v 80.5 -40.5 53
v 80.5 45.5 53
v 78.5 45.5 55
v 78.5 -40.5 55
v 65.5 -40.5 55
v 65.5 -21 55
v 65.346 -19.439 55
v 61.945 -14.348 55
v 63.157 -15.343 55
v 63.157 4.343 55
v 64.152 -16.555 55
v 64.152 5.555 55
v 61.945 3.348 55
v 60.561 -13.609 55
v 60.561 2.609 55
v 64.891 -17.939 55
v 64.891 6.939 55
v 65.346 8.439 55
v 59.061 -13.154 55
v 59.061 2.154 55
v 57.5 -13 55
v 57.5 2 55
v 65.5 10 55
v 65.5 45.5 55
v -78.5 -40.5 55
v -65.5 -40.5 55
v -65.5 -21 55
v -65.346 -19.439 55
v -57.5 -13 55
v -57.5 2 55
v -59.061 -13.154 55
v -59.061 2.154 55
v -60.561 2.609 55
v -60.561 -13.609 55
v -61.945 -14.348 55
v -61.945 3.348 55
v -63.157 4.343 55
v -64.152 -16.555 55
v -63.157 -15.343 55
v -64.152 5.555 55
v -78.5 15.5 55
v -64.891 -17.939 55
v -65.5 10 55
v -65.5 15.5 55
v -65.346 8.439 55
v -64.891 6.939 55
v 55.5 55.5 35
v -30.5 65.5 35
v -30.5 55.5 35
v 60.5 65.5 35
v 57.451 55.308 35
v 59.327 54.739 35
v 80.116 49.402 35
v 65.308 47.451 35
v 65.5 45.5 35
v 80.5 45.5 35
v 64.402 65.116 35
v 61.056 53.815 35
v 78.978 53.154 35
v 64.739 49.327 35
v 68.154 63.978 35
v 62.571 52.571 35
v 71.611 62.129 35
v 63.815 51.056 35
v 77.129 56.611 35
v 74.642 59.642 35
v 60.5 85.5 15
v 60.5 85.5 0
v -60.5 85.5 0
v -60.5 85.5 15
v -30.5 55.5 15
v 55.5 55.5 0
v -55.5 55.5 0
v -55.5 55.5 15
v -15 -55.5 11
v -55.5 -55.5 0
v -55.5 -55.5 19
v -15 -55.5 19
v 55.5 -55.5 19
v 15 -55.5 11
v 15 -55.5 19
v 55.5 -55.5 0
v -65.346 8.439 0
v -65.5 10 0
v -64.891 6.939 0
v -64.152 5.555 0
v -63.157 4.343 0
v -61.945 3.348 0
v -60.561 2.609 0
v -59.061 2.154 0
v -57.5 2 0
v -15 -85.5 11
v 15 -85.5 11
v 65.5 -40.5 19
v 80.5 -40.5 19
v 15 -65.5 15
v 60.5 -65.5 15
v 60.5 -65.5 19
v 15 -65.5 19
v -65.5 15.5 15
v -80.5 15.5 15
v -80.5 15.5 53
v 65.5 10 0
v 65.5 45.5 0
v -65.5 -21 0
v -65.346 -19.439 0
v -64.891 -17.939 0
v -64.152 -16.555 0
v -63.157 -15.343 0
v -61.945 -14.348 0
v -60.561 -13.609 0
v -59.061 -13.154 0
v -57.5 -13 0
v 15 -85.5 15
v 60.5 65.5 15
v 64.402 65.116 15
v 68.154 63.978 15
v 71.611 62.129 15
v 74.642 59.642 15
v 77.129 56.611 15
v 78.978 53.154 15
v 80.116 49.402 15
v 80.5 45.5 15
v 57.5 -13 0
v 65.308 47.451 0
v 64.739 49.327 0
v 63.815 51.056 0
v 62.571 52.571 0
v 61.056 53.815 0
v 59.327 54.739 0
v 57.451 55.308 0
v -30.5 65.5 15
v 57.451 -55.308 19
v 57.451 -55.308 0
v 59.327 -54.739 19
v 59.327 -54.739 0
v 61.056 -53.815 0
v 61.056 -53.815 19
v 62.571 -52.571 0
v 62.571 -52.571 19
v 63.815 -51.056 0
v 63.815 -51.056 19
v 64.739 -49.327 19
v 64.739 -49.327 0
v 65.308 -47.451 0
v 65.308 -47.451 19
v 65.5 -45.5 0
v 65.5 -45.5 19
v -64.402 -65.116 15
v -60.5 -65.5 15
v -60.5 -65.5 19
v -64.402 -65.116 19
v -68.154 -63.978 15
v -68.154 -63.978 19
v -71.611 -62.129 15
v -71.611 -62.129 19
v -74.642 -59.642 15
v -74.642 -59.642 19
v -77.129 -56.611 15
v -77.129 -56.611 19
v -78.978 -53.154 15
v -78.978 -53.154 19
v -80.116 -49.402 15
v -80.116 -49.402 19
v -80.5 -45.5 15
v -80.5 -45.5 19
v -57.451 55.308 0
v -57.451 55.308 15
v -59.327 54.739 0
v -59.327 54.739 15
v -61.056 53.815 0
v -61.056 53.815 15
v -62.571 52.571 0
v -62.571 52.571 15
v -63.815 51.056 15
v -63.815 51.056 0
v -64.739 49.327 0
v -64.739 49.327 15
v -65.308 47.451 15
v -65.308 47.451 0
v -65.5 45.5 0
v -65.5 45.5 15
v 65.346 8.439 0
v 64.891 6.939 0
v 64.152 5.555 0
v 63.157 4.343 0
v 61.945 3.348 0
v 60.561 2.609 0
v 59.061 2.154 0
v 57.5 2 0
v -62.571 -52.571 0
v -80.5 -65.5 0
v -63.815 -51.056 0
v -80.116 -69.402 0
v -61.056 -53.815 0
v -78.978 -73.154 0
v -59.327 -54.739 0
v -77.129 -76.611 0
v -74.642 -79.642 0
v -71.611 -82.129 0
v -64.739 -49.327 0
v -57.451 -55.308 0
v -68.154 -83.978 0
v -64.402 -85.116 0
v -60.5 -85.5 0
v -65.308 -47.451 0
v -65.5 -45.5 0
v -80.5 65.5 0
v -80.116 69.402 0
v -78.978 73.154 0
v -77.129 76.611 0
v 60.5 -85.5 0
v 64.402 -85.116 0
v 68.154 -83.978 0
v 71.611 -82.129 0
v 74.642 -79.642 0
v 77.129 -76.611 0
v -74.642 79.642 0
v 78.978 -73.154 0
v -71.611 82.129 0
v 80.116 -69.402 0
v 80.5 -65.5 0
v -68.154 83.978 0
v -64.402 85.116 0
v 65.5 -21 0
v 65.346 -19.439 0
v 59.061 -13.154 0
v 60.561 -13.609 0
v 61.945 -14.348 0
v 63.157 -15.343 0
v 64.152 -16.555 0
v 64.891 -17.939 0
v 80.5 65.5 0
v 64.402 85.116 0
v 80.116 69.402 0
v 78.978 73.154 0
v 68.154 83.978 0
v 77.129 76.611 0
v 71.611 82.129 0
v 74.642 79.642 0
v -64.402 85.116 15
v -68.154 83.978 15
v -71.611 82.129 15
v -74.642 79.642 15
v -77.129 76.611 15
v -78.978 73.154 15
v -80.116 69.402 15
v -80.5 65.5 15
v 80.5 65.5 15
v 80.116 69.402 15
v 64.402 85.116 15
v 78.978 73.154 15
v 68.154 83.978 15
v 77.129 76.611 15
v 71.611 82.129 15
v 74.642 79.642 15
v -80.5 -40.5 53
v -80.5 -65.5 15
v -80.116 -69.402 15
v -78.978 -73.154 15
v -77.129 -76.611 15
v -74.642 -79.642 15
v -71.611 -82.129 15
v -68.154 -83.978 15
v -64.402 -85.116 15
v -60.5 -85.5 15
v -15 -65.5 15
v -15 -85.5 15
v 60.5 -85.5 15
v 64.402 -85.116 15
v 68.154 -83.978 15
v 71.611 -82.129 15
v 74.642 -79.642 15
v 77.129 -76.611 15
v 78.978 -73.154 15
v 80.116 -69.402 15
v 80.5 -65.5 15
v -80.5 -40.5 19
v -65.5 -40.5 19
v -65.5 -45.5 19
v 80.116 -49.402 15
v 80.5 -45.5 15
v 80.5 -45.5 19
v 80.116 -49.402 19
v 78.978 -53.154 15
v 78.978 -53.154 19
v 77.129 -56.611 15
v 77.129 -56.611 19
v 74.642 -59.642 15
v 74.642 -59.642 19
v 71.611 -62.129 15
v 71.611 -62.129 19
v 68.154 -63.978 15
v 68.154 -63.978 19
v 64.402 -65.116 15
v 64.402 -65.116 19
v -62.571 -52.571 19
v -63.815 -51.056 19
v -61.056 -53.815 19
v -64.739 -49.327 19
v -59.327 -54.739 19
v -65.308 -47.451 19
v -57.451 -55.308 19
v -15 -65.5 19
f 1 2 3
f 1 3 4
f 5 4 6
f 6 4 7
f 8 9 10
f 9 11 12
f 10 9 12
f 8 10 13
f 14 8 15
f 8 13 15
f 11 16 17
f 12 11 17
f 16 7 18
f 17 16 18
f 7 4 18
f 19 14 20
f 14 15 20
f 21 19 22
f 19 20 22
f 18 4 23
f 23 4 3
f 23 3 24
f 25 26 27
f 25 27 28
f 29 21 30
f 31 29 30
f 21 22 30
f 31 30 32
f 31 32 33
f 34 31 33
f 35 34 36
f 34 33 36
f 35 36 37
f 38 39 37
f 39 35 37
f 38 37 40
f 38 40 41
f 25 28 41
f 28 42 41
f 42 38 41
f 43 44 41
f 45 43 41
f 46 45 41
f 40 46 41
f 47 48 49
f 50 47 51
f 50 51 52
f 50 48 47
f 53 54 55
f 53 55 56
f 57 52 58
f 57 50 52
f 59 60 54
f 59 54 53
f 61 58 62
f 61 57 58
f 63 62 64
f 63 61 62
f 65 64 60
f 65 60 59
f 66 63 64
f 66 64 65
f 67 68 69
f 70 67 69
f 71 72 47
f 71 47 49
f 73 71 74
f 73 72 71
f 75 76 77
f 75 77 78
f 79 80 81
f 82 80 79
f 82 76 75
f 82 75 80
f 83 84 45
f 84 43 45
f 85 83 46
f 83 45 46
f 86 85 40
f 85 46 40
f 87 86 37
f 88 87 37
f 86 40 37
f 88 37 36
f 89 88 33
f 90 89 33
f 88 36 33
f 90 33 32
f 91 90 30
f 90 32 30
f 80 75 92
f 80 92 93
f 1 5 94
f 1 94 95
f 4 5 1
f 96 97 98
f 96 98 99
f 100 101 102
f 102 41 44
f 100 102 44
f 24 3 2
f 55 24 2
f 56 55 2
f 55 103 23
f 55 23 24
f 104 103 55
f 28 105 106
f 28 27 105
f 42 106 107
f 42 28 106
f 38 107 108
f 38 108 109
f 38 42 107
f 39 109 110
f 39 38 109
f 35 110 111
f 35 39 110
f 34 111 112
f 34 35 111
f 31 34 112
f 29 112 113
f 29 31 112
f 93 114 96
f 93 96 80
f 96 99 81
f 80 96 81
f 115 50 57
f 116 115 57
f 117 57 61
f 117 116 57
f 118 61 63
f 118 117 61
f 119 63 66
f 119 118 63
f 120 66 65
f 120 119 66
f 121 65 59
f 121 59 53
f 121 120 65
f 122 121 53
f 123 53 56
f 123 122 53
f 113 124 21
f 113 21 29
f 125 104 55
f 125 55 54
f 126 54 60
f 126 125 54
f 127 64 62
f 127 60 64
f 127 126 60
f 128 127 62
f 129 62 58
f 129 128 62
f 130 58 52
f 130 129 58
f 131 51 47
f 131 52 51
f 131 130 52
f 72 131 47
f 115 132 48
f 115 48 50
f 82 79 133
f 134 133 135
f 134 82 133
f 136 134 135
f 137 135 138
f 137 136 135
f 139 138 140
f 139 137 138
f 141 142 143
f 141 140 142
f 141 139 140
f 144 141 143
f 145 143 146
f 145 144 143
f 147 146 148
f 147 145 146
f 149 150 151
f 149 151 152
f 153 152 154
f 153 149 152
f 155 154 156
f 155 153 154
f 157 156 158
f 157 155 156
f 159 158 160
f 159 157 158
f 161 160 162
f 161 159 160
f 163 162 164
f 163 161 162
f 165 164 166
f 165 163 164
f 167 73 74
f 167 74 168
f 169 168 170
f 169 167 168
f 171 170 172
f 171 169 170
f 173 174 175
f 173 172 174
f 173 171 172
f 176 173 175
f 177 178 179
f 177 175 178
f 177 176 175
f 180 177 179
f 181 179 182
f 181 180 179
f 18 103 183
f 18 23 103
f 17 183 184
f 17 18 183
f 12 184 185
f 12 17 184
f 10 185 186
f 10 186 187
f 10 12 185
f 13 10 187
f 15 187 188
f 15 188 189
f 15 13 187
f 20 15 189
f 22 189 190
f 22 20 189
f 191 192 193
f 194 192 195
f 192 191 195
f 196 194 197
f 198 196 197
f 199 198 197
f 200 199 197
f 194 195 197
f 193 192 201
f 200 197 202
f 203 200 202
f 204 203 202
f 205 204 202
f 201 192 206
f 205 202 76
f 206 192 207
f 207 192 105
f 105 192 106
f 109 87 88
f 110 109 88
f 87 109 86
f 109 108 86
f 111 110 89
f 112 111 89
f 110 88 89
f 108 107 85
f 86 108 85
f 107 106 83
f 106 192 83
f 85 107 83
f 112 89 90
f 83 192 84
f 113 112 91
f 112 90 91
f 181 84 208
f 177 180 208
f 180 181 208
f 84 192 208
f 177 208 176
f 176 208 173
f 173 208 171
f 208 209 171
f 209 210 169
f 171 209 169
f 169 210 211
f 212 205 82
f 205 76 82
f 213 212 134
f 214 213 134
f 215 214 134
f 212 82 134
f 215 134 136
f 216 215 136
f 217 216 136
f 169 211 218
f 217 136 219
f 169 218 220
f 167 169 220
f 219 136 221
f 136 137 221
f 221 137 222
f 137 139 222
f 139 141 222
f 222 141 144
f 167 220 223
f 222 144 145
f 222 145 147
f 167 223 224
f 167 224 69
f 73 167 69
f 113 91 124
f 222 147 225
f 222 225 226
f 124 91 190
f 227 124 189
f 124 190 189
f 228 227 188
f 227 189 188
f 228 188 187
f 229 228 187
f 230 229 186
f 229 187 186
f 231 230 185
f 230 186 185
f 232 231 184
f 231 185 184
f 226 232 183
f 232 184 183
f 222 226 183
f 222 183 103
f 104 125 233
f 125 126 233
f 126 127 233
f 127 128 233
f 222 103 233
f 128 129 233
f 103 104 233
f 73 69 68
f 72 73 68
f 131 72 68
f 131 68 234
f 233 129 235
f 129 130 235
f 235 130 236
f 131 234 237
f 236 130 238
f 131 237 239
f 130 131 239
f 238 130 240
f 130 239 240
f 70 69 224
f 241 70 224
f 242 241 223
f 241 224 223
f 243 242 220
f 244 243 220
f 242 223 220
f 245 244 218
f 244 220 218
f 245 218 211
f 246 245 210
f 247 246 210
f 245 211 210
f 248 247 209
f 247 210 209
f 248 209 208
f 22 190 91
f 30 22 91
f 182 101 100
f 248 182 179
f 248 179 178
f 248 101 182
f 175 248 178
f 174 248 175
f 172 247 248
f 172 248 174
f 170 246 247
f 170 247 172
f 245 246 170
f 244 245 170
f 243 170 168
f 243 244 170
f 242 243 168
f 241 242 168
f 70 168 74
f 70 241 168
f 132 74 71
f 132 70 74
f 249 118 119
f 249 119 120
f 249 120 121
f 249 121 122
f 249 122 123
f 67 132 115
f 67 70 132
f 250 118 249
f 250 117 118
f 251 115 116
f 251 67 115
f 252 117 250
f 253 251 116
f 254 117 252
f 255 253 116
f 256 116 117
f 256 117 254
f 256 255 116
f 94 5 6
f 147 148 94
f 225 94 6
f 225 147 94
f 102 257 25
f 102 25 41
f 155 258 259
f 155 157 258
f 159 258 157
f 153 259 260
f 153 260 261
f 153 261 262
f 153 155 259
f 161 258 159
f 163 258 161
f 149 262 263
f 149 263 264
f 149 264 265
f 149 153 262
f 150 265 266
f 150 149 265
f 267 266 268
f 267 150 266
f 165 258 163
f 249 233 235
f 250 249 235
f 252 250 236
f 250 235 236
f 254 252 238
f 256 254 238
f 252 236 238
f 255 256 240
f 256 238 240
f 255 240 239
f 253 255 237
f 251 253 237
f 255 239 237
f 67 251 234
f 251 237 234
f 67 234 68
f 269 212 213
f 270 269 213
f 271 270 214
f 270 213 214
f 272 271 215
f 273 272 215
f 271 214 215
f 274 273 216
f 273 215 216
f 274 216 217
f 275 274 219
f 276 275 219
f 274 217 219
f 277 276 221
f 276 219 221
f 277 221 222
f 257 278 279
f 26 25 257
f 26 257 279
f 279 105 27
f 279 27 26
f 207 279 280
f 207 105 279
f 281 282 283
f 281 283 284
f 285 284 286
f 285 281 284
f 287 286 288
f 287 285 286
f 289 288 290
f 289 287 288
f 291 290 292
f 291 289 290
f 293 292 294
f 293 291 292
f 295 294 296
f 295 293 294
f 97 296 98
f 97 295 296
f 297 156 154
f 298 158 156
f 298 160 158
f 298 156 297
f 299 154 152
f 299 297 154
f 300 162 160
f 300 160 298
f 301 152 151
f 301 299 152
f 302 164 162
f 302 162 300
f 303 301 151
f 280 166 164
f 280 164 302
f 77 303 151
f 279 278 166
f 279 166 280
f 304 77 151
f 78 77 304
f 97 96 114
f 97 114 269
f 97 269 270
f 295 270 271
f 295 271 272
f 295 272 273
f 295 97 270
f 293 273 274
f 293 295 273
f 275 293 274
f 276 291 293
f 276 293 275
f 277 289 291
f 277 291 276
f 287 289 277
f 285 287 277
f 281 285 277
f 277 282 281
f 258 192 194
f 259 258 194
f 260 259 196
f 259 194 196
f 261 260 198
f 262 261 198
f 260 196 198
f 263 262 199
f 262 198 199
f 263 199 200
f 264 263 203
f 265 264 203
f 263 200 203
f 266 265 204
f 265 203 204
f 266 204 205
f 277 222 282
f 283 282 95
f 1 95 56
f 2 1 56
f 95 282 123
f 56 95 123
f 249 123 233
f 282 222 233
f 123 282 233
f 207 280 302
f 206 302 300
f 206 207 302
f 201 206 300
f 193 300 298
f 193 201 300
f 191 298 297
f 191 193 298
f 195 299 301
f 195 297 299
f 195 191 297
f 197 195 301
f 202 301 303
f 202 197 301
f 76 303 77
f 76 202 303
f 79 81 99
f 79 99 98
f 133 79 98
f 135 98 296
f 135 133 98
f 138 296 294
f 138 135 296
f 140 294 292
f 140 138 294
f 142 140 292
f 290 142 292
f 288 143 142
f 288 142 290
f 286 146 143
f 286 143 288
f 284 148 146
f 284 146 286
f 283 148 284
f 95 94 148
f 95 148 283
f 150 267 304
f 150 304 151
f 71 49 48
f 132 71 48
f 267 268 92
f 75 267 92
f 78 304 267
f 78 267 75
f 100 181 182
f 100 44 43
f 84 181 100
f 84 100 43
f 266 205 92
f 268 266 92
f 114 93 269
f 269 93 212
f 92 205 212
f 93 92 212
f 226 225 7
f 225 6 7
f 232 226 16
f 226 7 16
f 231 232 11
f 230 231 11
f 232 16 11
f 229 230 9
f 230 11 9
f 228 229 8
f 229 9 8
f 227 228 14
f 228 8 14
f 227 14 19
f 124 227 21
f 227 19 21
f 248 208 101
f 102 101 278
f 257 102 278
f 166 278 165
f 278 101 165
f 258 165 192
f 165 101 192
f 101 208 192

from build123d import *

# Parameters (mm, degrees)
BOSS_EXTRUDE1_DEPTH = 55
BOSS_EXTRUDE3_DEPTH = 15
SKETCH4_W           = 190.013565595
SKETCH4_H           = 25
CUT_EXTRUDE1_DEPTH  = 36
SKETCH5_W           = 30
SKETCH5_H           = 30
CUT_EXTRUDE2_DEPTH  = 8
SKETCH6_W           = 72.414600628
SKETCH6_H           = 59.825353167
CUT_EXTRUDE3_DEPTH  = 40
SKETCH7_W           = 143.244471566
SKETCH7_H           = 49.658158813
CUT_EXTRUDE4_DEPTH  = 20
SKETCH8_W           = 131
SKETCH8_H           = 15
BOSS_EXTRUDE4_DEPTH = 55
FILLET1_R           = 8
CHAMFER1_SIZE       = 2


with BuildPart() as part:
    # Sketch1 → Boss-Extrude1 (new body)
    with BuildSketch(Plane.XY):
        with BuildLine():
            Line((-60.5, 65.5), (60.5, 65.5))
            ThreePointArc((60.5, 65.5), (74.642135624, 59.642135624), (80.5, 45.5))
            Line((80.5, 45.5), (80.5, -45.5))
            ThreePointArc((80.5, -45.5), (74.642135624, -59.642135624), (60.5, -65.5))
            Line((60.5, -65.5), (-60.5, -65.5))
            ThreePointArc((-60.5, -65.5), (-74.642135624, -59.642135624), (-80.5, -45.5))
            Line((-80.5, -45.5), (-80.5, 45.5))
            ThreePointArc((-80.5, 45.5), (-74.642135624, 59.642135624), (-60.5, 65.5))
        make_face()
        with BuildLine():
            Line((-65.5, 45.5), (-65.5, -45.5))
            ThreePointArc((-65.5, -45.5), (-62.571067812, -52.571067812), (-55.5, -55.5))
            Line((-55.5, -55.5), (55.5, -55.5))
            ThreePointArc((55.5, -55.5), (62.571067812, -52.571067812), (65.5, -45.5))
            Line((65.5, -45.5), (65.5, 45.5))
            ThreePointArc((65.5, 45.5), (62.571067812, 52.571067812), (55.5, 55.5))
            Line((55.5, 55.5), (-55.5, 55.5))
            ThreePointArc((-55.5, 55.5), (-62.571067812, 52.571067812), (-65.5, 45.5))
        make_face(mode=Mode.SUBTRACT)
    extrude(amount=BOSS_EXTRUDE1_DEPTH)

    # Sketch3 → Boss-Extrude3 (add)
    with BuildSketch(Plane(origin=(0, 0, 0), x_dir=(-1, 0, 0), z_dir=(0, 0, -1))):
        with BuildLine():
            Line((-80.5, 45.5), (-80.5, 65.5))
            ThreePointArc((-80.5, 65.5), (-74.642135624, 79.642135624), (-60.5, 85.5))
            Line((-60.5, 85.5), (60.5, 85.5))
            ThreePointArc((60.5, 85.5), (74.642135624, 79.642135624), (80.5, 65.5))
            Line((80.5, 65.5), (80.5, 45.5))
            ThreePointArc((80.5, 45.5), (74.642135624, 59.642135624), (60.5, 65.5))
            Line((60.5, 65.5), (-60.5, 65.5))
            ThreePointArc((-60.5, 65.5), (-74.642135624, 59.642135624), (-80.5, 45.5))
        make_face()
        with BuildLine():
            Line((80.5, -45.5), (80.5, -65.5))
            ThreePointArc((80.5, -65.5), (74.642135624, -79.642135624), (60.5, -85.5))
            Line((60.5, -85.5), (-60.5, -85.5))
            ThreePointArc((-60.5, -85.5), (-74.642135624, -79.642135624), (-80.5, -65.5))
            Line((-80.5, -65.5), (-80.5, -45.5))
            ThreePointArc((-80.5, -45.5), (-74.642135624, -59.642135624), (-60.5, -65.5))
            Line((-60.5, -65.5), (60.5, -65.5))
            ThreePointArc((60.5, -65.5), (74.642135624, -59.642135624), (80.5, -45.5))
        make_face()
    extrude(amount=-BOSS_EXTRUDE3_DEPTH)

    # Sketch4 → Cut-Extrude1 (cut)
    with BuildSketch(Plane.XY.offset(55)):
        with Locations((-0.225937653, -53)):
            Rectangle(SKETCH4_W, SKETCH4_H)
    extrude(amount=-CUT_EXTRUDE1_DEPTH, mode=Mode.SUBTRACT)

    # Sketch5 → Cut-Extrude2 (cut)
    with BuildSketch(Plane.XY.offset(19)):
        with Locations((0, -70.5)):
            Rectangle(SKETCH5_W, SKETCH5_H)
    extrude(amount=-CUT_EXTRUDE2_DEPTH, mode=Mode.SUBTRACT)

    # Sketch6 → Cut-Extrude3 (cut)
    with BuildSketch(Plane.XY.offset(55)):
        with Locations((-66.707300314, 45.412676584)):
            Rectangle(SKETCH6_W, SKETCH6_H)
    extrude(amount=-CUT_EXTRUDE3_DEPTH, mode=Mode.SUBTRACT)

    # Sketch7 → Cut-Extrude4 (cut)
    with BuildSketch(Plane.XY.offset(55)):
        with Locations((34.229554325, 70.329079407)):
            Rectangle(SKETCH7_W, SKETCH7_H)
    extrude(amount=-CUT_EXTRUDE4_DEPTH, mode=Mode.SUBTRACT)

    # Sketch8 → Boss-Extrude4 (add)
    with BuildSketch(Plane(origin=(0, 0, 0), x_dir=(-1, 0, 0), z_dir=(0, 0, -1))):
        with Locations((0, -5.5)):
            Rectangle(SKETCH8_W, SKETCH8_H)
    extrude(amount=-BOSS_EXTRUDE4_DEPTH)

    # Fillet1
    fillet1_edges = [part.edges().sort_by_distance(p)[0] for p in [
        (-65.5, -13, 27.5),
        (-65.5, 2, 27.5),
        (65.5, 2, 27.5),
        (65.5, -13, 27.5),
    ]]
    fillet(fillet1_edges, radius=FILLET1_R)

    # Chamfer1
    chamfer1_edges = [part.edges().sort_by_distance(p)[0] for p in [
        (80.5, 2.5, 55),
        (-80.5, -12.5, 55),
    ]]
    chamfer(chamfer1_edges, length=CHAMFER1_SIZE)


solid = part.part
